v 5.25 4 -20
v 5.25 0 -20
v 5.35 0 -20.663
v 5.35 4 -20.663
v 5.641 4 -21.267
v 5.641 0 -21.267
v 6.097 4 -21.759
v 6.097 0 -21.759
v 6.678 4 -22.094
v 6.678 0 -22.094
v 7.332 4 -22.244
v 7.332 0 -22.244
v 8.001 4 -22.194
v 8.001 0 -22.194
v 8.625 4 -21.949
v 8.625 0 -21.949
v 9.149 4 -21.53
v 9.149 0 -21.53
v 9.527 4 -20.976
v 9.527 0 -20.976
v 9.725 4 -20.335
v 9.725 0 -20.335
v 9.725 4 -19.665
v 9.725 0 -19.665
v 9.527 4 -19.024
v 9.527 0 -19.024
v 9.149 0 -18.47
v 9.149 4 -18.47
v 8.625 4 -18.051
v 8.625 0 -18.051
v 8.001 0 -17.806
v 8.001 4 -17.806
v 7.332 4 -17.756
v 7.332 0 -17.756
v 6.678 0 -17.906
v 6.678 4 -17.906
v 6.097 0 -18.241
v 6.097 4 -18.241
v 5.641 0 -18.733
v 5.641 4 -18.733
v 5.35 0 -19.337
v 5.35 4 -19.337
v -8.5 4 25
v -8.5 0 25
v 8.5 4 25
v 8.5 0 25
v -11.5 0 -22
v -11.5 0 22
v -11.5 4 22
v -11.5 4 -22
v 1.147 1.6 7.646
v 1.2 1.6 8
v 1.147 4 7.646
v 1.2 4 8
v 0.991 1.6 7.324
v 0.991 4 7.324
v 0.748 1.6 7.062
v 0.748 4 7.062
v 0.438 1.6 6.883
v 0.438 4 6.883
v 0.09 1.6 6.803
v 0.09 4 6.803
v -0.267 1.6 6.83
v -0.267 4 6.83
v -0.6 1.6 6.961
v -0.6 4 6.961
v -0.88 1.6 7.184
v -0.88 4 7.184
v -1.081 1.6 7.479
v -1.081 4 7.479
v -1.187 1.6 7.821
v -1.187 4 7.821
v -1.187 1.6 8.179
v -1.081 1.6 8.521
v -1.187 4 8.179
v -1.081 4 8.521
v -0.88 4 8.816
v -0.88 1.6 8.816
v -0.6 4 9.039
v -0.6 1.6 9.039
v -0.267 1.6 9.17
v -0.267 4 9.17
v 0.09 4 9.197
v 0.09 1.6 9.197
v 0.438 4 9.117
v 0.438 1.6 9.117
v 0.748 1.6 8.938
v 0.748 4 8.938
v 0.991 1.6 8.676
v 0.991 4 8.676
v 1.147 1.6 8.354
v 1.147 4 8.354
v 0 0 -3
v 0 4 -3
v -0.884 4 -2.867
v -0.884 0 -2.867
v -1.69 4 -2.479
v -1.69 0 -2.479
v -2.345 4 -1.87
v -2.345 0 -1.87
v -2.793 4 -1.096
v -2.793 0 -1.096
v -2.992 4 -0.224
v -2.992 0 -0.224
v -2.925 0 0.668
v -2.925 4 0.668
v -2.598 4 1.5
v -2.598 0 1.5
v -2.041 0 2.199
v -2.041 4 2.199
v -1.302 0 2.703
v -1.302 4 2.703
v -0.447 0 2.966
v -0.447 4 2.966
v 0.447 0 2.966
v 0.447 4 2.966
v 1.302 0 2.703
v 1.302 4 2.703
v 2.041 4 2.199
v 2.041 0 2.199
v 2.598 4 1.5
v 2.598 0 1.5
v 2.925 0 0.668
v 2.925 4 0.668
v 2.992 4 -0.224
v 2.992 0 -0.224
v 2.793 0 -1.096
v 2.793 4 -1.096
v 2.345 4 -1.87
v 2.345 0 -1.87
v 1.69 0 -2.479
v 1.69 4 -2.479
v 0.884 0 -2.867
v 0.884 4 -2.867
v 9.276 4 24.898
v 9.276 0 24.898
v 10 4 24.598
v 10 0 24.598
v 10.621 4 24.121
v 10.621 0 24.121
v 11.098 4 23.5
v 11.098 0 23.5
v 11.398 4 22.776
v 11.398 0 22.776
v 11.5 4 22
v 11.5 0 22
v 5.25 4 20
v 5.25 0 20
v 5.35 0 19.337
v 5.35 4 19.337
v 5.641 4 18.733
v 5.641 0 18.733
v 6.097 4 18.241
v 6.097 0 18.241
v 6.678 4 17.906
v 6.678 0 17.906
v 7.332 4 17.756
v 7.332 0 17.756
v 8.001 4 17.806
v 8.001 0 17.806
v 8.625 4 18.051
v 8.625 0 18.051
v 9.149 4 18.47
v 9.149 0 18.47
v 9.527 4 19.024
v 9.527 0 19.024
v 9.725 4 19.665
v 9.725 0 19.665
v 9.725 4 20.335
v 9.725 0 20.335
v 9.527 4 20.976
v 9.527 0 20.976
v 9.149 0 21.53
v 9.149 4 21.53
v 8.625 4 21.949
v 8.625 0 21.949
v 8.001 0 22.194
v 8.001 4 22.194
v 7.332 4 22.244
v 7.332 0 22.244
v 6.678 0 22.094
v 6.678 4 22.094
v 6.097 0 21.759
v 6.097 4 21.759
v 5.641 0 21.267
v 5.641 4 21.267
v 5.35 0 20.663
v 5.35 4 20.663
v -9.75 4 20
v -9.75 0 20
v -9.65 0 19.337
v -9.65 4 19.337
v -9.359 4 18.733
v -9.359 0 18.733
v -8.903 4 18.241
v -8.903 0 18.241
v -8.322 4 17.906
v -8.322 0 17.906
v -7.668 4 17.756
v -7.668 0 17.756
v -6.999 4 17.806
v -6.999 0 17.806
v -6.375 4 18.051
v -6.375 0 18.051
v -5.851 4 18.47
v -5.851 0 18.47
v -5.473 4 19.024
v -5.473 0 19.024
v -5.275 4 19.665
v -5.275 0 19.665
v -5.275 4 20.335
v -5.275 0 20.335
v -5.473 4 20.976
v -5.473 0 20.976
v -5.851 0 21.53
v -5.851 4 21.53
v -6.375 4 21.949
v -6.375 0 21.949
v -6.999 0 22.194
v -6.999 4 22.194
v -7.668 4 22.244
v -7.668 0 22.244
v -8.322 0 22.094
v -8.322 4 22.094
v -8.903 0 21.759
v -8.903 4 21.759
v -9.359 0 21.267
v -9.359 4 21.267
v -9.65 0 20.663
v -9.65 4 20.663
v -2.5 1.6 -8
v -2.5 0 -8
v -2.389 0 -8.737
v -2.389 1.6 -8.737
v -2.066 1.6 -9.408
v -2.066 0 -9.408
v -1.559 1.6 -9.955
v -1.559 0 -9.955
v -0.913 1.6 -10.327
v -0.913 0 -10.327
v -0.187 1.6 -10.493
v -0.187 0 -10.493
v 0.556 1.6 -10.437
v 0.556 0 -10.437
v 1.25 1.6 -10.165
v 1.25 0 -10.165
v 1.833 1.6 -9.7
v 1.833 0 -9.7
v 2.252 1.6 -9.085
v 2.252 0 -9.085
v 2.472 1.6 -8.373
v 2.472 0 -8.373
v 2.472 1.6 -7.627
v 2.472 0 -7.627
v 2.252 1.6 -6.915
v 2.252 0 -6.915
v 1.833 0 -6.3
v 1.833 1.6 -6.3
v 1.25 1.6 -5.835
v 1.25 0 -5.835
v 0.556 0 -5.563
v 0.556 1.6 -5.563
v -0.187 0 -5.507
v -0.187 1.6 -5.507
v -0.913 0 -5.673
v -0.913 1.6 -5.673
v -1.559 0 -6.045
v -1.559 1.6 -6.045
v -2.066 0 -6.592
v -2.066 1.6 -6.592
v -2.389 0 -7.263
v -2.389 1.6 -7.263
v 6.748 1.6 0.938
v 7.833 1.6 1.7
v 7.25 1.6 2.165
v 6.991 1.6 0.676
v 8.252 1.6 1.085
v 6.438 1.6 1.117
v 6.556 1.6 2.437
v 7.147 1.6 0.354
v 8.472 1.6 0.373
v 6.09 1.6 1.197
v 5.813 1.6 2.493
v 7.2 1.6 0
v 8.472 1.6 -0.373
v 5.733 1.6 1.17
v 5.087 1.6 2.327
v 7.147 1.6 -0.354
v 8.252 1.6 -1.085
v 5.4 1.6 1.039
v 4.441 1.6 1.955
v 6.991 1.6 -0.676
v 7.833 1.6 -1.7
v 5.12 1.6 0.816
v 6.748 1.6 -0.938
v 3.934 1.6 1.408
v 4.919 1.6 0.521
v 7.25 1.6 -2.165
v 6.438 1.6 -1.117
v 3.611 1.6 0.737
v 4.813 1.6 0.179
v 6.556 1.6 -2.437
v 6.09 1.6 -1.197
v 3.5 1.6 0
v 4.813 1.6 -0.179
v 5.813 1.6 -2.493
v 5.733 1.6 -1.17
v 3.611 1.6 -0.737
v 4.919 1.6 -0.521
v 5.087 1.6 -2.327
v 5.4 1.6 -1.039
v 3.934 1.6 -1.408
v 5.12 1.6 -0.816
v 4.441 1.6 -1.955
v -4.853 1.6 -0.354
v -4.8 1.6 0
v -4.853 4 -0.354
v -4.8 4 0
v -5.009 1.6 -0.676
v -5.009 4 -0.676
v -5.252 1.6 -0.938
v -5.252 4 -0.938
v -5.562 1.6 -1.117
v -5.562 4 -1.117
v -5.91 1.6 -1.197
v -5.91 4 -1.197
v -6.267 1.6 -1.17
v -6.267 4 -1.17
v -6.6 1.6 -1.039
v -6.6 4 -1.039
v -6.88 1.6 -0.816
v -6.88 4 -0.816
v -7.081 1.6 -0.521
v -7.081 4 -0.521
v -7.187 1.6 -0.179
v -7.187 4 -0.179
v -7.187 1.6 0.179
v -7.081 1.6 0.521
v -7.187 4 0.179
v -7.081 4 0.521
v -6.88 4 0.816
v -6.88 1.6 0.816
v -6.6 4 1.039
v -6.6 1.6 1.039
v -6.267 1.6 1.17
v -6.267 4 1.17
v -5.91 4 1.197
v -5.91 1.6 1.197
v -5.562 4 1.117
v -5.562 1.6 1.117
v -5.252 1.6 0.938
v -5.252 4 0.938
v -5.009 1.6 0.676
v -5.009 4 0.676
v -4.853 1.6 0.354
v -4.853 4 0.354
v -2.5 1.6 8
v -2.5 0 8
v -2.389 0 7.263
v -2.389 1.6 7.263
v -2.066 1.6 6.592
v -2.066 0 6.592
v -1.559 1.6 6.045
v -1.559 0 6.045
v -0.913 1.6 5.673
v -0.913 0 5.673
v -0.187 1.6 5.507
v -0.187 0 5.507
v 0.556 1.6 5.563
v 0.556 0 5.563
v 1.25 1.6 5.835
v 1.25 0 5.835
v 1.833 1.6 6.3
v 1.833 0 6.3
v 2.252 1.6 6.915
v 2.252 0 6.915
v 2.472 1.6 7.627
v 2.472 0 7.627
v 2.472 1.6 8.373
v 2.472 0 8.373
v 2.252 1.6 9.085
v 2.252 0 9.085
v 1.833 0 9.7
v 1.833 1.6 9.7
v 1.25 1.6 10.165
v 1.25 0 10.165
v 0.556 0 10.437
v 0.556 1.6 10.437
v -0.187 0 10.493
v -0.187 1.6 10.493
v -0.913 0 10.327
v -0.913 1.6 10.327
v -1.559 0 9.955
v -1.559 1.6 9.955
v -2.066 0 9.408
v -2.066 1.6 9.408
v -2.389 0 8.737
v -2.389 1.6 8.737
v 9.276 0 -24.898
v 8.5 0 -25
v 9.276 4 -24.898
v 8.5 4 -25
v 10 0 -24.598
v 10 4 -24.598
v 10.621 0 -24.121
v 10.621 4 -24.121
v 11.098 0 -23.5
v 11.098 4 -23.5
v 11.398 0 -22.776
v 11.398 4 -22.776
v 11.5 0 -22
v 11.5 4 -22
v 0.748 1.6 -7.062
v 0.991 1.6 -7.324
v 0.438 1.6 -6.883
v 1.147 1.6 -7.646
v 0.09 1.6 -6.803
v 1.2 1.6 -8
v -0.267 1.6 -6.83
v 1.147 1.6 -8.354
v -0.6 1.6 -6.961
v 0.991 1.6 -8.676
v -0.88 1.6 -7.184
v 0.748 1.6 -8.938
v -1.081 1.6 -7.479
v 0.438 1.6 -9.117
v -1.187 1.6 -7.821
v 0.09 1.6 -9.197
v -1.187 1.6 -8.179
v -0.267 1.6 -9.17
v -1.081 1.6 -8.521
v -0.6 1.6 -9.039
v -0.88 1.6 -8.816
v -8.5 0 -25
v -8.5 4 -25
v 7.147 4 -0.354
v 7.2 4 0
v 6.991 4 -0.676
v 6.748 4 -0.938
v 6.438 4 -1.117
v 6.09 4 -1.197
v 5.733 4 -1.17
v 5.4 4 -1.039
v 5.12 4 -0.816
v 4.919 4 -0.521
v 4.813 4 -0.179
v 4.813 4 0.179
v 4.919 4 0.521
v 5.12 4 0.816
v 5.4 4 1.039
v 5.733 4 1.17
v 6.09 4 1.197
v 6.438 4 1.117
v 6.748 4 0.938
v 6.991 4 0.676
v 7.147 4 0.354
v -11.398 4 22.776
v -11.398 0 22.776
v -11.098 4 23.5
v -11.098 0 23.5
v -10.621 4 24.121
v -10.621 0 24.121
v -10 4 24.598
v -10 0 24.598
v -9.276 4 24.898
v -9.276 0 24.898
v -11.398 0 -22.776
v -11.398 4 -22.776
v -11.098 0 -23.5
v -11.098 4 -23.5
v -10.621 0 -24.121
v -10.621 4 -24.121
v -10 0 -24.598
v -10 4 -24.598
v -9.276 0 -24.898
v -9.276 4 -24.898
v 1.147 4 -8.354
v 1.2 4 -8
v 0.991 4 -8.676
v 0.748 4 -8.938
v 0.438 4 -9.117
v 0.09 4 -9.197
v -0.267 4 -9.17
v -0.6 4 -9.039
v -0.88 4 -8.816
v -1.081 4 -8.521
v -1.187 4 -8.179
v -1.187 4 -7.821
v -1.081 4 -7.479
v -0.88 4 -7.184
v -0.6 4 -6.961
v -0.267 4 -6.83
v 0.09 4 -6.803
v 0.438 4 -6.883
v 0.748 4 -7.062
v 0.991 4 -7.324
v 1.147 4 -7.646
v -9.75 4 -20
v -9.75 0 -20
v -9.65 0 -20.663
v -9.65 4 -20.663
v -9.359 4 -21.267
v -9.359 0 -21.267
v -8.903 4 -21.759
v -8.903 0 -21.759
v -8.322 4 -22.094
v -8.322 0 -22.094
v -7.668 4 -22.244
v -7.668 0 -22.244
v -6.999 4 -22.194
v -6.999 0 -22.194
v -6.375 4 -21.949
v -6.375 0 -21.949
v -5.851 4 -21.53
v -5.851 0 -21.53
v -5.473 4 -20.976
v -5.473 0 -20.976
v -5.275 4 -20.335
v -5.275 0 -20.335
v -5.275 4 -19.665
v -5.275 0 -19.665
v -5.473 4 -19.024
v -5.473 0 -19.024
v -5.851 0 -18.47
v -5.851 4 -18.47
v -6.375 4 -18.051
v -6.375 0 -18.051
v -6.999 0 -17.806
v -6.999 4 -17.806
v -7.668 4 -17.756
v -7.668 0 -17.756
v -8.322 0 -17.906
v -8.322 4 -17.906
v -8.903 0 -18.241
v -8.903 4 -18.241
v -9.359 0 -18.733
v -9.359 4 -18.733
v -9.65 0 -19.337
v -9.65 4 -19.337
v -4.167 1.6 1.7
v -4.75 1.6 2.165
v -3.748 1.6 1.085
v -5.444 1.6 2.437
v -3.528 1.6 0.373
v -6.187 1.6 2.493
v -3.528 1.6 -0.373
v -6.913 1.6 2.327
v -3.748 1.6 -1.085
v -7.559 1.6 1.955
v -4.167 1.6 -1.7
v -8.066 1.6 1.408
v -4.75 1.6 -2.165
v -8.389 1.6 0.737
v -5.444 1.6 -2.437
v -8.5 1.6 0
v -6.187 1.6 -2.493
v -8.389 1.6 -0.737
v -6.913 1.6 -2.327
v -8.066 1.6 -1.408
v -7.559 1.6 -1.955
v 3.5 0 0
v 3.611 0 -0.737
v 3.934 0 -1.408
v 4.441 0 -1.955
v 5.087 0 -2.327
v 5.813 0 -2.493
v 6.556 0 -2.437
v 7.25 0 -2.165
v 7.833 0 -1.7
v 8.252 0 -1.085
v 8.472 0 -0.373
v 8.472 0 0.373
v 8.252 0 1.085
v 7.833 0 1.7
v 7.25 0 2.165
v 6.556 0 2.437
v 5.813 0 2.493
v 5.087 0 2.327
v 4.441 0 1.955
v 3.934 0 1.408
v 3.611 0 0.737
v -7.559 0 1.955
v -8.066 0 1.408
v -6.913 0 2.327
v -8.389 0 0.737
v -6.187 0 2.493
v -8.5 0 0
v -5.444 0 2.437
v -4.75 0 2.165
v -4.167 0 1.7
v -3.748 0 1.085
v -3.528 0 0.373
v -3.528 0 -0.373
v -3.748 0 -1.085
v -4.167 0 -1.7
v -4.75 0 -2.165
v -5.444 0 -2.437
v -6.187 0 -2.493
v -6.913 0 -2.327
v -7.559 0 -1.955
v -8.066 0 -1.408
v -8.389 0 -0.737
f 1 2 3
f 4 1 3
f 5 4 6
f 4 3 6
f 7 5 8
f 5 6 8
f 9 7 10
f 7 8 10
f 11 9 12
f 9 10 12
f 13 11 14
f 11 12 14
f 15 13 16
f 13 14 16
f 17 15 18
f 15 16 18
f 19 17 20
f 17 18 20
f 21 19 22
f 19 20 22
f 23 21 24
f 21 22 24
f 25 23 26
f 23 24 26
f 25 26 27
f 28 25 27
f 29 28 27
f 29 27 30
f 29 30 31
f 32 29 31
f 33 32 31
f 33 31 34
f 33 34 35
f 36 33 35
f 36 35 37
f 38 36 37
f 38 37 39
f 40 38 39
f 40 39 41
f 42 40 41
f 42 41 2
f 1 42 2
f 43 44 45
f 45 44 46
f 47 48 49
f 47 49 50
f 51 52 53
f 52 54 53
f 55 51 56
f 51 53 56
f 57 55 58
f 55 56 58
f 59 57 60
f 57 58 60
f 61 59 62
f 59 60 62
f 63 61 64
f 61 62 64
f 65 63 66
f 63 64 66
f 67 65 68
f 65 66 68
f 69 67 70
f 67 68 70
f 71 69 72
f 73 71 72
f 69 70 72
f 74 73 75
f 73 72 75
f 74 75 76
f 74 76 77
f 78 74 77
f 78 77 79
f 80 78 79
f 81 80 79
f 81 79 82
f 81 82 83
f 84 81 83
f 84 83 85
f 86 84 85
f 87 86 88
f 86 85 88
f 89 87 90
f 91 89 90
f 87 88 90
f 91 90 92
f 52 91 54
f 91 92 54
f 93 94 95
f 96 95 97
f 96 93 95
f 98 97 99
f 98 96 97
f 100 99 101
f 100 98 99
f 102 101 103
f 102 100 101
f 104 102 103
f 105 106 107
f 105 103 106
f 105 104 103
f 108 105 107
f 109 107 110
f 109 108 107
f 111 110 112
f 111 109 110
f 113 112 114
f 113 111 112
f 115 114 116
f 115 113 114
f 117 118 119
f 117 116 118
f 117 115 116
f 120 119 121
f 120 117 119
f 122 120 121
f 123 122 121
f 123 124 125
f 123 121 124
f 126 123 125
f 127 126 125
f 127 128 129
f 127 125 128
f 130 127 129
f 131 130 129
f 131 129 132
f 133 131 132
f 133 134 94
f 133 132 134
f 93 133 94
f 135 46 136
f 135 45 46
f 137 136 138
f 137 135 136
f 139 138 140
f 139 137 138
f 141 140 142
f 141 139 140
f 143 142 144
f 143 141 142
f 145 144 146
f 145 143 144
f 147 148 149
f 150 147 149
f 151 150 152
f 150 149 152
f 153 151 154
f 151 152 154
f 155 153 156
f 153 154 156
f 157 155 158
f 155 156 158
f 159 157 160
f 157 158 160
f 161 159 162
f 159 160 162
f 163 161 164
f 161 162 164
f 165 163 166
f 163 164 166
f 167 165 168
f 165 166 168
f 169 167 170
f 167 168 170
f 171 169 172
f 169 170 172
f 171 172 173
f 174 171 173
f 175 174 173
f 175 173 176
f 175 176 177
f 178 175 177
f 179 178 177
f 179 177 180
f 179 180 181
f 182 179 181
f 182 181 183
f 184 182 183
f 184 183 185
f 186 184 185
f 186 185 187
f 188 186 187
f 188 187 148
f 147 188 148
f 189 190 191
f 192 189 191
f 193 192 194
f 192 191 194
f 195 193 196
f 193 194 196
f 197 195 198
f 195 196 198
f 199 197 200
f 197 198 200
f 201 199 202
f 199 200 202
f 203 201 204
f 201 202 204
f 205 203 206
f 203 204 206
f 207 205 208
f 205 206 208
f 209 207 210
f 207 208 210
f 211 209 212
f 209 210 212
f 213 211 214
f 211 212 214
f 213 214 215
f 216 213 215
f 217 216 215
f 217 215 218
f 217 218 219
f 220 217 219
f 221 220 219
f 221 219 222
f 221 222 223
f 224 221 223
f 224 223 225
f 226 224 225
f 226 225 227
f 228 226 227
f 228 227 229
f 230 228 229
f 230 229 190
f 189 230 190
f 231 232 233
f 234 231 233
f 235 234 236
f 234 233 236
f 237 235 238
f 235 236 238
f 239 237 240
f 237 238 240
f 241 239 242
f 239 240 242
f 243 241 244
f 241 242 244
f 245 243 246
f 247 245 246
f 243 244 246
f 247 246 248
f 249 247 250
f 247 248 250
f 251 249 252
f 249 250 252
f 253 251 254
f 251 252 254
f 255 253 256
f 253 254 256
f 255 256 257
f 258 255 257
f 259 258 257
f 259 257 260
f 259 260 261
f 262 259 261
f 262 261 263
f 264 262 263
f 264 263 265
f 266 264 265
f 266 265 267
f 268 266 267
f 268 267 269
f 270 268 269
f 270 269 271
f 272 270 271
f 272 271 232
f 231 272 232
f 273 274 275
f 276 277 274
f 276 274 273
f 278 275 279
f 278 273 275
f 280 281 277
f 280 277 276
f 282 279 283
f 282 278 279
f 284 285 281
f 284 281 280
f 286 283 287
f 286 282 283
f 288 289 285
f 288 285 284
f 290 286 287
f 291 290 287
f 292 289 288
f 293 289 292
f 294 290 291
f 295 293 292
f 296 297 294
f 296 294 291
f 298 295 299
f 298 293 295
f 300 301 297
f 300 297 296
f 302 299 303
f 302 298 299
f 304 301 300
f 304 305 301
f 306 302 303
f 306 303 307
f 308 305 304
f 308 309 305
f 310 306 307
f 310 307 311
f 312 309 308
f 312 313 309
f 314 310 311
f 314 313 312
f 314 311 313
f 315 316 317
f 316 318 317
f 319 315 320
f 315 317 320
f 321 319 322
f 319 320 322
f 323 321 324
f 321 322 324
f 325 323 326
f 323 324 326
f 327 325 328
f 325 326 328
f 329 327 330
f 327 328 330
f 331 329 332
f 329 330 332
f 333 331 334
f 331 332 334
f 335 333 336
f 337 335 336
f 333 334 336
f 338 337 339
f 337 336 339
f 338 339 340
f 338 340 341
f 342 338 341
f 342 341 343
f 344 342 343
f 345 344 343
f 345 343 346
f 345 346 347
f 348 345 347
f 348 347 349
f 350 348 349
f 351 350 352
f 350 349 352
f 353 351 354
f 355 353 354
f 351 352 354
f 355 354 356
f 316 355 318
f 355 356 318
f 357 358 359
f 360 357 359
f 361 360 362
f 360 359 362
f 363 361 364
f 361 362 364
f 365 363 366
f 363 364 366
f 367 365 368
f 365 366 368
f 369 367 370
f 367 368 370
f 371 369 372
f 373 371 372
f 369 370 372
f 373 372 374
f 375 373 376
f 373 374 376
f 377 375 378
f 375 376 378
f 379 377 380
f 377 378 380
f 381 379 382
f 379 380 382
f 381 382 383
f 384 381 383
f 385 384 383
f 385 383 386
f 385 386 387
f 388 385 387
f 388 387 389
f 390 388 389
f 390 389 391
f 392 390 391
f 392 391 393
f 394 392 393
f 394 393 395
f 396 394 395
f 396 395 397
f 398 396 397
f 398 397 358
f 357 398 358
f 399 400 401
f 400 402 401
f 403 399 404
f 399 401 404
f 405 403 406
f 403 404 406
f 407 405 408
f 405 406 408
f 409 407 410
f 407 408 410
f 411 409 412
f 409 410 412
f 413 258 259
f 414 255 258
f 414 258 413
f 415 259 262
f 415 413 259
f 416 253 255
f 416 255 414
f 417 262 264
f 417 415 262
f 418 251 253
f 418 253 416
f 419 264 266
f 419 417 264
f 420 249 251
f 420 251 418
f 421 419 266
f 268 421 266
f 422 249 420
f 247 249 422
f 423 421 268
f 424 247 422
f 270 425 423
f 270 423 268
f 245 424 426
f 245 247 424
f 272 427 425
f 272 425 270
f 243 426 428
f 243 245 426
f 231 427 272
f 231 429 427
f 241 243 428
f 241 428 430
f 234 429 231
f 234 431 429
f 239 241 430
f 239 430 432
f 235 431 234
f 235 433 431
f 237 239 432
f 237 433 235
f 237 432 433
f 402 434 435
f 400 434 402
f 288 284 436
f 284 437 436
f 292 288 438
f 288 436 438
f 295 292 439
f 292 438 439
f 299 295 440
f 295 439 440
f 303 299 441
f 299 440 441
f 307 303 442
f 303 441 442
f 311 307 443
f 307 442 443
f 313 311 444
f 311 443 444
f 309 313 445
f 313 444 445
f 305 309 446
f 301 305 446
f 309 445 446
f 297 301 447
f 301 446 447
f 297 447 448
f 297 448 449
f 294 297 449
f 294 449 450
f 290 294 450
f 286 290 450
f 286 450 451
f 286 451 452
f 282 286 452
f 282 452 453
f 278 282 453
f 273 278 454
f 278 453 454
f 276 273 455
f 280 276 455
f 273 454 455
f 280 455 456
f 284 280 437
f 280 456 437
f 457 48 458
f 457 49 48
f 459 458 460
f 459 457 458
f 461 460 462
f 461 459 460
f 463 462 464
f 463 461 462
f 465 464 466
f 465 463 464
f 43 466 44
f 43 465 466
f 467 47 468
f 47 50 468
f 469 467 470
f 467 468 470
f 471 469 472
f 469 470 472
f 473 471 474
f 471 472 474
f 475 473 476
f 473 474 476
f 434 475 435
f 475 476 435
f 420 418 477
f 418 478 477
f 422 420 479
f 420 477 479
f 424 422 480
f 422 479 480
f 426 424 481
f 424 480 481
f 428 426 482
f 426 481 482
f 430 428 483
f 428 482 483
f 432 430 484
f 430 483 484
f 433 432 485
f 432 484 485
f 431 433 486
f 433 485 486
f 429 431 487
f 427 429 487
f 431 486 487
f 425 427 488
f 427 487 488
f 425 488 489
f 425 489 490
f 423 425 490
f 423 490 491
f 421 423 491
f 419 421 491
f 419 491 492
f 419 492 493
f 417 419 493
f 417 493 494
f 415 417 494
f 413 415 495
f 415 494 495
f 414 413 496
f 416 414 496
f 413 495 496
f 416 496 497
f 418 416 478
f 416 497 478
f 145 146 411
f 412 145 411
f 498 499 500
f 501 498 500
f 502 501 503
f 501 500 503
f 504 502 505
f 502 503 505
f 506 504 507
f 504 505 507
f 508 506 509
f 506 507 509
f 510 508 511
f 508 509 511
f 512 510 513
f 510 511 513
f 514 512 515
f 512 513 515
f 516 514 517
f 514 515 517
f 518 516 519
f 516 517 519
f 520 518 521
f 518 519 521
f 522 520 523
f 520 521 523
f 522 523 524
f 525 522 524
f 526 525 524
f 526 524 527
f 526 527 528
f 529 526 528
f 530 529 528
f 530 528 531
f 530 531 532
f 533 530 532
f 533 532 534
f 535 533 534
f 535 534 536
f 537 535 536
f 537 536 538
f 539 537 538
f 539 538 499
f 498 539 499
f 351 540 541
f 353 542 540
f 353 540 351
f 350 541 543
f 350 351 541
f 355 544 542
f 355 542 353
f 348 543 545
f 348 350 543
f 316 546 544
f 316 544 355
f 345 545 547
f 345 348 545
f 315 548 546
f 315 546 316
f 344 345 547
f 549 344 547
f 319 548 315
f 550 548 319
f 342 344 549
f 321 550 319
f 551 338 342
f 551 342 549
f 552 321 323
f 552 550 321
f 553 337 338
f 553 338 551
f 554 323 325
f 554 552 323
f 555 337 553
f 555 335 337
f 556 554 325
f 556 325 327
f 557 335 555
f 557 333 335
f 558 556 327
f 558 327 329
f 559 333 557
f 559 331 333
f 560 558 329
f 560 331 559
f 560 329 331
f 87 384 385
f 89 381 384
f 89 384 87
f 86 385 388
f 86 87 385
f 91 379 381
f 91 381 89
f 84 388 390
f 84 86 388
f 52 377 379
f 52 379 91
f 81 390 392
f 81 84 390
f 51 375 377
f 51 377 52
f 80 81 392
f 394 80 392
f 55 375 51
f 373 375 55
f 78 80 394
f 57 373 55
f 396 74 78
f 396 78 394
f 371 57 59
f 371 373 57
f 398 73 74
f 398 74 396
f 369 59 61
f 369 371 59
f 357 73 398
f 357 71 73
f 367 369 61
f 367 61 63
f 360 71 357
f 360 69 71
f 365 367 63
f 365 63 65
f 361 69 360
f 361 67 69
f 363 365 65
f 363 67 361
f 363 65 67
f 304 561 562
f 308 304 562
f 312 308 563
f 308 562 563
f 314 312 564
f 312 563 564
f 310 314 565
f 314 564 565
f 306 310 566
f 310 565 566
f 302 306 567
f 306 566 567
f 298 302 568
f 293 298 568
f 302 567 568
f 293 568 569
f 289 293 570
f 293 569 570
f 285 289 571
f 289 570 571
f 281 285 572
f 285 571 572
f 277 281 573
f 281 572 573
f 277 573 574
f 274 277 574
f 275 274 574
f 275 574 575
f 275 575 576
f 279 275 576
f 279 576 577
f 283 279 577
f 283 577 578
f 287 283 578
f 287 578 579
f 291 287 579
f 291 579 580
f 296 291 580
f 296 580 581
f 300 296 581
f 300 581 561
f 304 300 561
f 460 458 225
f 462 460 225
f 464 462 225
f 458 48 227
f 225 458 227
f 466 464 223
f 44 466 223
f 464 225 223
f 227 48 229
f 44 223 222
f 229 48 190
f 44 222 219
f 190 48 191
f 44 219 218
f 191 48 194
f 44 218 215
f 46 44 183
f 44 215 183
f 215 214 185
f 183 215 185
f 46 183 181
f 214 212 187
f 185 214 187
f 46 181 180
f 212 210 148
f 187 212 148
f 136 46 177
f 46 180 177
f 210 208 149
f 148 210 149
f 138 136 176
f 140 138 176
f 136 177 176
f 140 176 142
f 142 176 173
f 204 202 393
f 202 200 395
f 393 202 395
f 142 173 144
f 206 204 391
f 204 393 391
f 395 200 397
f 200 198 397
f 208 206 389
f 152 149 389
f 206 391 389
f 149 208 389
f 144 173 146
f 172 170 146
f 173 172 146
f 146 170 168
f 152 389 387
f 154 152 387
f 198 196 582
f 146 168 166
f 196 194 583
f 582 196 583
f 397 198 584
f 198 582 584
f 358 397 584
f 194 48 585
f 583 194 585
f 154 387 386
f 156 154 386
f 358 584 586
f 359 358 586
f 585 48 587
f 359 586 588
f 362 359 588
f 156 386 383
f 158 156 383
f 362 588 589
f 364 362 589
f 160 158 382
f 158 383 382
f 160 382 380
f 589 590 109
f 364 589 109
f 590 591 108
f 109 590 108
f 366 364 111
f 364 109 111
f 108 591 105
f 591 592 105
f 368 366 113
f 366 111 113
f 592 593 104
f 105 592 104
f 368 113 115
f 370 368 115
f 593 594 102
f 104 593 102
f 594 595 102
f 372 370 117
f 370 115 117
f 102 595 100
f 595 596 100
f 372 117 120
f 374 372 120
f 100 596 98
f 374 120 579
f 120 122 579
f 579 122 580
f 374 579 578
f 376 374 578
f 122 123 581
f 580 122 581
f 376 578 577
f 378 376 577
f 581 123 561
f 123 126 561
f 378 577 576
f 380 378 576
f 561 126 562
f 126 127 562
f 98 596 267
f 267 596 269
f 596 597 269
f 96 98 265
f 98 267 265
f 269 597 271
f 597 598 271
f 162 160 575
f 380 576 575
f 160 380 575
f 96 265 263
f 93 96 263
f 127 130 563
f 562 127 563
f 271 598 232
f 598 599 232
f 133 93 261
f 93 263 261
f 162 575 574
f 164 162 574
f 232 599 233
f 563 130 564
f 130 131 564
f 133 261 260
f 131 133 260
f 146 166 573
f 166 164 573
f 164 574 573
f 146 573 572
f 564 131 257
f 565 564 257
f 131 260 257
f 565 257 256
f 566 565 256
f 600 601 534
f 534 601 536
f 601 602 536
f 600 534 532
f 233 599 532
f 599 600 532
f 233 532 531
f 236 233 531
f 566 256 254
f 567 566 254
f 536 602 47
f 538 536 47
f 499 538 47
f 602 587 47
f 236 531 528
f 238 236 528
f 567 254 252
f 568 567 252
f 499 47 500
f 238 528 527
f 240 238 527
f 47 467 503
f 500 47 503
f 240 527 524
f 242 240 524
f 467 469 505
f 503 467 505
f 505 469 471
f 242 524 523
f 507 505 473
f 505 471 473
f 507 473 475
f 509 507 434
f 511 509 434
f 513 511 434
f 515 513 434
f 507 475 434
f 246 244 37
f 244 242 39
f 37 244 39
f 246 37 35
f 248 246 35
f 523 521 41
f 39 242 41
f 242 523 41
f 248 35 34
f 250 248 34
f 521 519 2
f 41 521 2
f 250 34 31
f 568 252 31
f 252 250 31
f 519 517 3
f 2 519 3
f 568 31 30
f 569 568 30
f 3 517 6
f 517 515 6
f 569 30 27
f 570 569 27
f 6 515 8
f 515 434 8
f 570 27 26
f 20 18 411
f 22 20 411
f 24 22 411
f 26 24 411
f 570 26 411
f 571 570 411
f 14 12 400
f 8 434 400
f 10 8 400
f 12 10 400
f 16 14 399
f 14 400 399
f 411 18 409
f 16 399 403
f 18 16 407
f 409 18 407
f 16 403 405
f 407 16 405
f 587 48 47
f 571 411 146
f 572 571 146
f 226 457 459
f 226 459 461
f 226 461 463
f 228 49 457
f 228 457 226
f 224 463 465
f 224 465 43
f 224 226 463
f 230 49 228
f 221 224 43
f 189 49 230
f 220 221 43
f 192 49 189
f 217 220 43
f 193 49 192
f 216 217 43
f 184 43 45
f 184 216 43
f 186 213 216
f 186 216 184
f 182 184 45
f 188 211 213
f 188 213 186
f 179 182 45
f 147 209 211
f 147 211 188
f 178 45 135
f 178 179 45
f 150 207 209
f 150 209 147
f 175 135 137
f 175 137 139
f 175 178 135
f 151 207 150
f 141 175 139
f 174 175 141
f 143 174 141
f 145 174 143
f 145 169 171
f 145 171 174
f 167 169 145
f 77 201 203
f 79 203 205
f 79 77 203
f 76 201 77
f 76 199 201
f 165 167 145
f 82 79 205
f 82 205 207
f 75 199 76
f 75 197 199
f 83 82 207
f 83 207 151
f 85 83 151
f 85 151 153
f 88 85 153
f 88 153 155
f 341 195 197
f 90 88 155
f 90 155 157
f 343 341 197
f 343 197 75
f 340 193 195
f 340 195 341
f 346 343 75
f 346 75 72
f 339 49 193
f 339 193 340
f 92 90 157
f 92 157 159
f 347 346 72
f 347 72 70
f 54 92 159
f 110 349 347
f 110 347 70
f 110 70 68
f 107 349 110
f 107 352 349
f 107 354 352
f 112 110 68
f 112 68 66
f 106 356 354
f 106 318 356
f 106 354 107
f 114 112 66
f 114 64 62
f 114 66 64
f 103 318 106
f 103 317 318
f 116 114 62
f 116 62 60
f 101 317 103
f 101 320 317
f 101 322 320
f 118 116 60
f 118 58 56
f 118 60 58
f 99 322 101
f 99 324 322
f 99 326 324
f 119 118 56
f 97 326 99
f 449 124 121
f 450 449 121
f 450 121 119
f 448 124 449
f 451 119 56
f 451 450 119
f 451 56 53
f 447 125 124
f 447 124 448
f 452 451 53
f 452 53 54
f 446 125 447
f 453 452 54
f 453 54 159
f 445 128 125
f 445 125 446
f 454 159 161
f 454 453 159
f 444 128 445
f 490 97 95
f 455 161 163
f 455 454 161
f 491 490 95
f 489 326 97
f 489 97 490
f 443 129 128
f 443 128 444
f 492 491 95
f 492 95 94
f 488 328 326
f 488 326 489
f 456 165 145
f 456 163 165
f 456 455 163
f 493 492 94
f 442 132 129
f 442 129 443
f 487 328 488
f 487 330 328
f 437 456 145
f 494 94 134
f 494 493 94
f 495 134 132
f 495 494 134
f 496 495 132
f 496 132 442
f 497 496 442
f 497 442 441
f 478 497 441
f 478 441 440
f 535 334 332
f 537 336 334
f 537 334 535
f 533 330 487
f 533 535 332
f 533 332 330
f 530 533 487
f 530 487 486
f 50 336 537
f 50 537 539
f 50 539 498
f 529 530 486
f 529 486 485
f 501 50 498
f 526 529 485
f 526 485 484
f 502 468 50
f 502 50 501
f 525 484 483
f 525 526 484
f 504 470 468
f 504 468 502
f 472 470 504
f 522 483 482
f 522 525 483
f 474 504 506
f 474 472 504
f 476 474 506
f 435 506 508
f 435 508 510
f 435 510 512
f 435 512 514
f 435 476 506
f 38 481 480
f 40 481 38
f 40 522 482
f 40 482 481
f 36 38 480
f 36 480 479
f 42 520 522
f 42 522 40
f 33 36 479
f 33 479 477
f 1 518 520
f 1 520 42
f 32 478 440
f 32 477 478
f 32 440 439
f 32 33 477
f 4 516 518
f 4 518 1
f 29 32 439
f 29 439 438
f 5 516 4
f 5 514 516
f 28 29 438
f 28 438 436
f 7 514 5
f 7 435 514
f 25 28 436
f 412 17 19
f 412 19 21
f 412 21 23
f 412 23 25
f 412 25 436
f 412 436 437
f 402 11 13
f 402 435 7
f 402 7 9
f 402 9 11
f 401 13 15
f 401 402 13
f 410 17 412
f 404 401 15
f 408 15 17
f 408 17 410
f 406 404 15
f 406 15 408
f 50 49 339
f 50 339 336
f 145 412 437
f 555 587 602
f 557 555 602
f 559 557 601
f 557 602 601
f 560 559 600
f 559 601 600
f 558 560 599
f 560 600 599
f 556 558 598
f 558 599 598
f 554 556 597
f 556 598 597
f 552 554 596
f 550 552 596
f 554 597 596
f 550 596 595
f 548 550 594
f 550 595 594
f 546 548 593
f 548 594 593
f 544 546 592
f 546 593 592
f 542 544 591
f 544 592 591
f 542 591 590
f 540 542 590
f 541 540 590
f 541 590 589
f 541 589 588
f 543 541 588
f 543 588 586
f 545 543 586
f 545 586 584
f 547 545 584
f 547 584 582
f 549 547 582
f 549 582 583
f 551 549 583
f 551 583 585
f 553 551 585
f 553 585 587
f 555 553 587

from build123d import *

# Parameters (mm, degrees)
SKETCH1_W                                        = 23
SKETCH1_H                                        = 50
BOSS_EXTRUDE1_DEPTH                              = 4
M4_CLEARANCE_HOLE1_D                             = 4.5
FILLET1_R                                        = 3
SKETCH4_R                                        = 3
CUT_EXTRUDE1_DEPTH                               = 10
CBORE_FOR_M2_PAN_HEAD_MACHINE_SCREW1_D           = 2.4
CBORE_FOR_M2_PAN_HEAD_MACHINE_SCREW1_CBORE_D     = 5
CBORE_FOR_M2_PAN_HEAD_MACHINE_SCREW1_CBORE_DEPTH = 1.6


with BuildPart() as part:
    # Sketch1 → Boss-Extrude1 (new body)
    with BuildSketch(Plane(origin=(0, 0, 0), x_dir=(1, 0, 0), z_dir=(0, 1, 0))):
        Rectangle(SKETCH1_W, SKETCH1_H)
    extrude(amount=BOSS_EXTRUDE1_DEPTH)

    # M4 Clearance Hole1 (through all)
    with Locations(Plane(origin=(0, 4, 0), x_dir=(1, 0, 0), z_dir=(0, 1, 0))):
        with Locations((-7.5, 20), (7.5, 20), (-7.5, -20), (7.5, -20)):
            Hole(M4_CLEARANCE_HOLE1_D / 2)

    # Fillet1
    fillet1_edges = [part.edges().sort_by_distance(p)[0] for p in [
        (11.5, 2, 25),
        (-11.5, 2, 25),
        (-11.5, 2, -25),
        (11.5, 2, -25),
    ]]
    fillet(fillet1_edges, radius=FILLET1_R)

    # Sketch4 → Cut-Extrude1 (cut)
    with BuildSketch(Plane(origin=(0, 0, 0), x_dir=(1, 0, 0), z_dir=(0, 1, 0))):
        with Locations(Location((0, 0, 0), (0, 0, 90))):
            Circle(SKETCH4_R)
    extrude(amount=CUT_EXTRUDE1_DEPTH, mode=Mode.SUBTRACT)

    # CBORE for M2 Pan Head Machine Screw1 (through all)
    with Locations(Plane(origin=(0, 0, 0), x_dir=(-1, 0, 0), z_dir=(0, -1, 0))):
        with Locations((0, -8), (-6, 0), (0, 8), (6, 0)):
            CounterBoreHole(CBORE_FOR_M2_PAN_HEAD_MACHINE_SCREW1_D / 2, CBORE_FOR_M2_PAN_HEAD_MACHINE_SCREW1_CBORE_D / 2, CBORE_FOR_M2_PAN_HEAD_MACHINE_SCREW1_CBORE_DEPTH)


solid = part.part
